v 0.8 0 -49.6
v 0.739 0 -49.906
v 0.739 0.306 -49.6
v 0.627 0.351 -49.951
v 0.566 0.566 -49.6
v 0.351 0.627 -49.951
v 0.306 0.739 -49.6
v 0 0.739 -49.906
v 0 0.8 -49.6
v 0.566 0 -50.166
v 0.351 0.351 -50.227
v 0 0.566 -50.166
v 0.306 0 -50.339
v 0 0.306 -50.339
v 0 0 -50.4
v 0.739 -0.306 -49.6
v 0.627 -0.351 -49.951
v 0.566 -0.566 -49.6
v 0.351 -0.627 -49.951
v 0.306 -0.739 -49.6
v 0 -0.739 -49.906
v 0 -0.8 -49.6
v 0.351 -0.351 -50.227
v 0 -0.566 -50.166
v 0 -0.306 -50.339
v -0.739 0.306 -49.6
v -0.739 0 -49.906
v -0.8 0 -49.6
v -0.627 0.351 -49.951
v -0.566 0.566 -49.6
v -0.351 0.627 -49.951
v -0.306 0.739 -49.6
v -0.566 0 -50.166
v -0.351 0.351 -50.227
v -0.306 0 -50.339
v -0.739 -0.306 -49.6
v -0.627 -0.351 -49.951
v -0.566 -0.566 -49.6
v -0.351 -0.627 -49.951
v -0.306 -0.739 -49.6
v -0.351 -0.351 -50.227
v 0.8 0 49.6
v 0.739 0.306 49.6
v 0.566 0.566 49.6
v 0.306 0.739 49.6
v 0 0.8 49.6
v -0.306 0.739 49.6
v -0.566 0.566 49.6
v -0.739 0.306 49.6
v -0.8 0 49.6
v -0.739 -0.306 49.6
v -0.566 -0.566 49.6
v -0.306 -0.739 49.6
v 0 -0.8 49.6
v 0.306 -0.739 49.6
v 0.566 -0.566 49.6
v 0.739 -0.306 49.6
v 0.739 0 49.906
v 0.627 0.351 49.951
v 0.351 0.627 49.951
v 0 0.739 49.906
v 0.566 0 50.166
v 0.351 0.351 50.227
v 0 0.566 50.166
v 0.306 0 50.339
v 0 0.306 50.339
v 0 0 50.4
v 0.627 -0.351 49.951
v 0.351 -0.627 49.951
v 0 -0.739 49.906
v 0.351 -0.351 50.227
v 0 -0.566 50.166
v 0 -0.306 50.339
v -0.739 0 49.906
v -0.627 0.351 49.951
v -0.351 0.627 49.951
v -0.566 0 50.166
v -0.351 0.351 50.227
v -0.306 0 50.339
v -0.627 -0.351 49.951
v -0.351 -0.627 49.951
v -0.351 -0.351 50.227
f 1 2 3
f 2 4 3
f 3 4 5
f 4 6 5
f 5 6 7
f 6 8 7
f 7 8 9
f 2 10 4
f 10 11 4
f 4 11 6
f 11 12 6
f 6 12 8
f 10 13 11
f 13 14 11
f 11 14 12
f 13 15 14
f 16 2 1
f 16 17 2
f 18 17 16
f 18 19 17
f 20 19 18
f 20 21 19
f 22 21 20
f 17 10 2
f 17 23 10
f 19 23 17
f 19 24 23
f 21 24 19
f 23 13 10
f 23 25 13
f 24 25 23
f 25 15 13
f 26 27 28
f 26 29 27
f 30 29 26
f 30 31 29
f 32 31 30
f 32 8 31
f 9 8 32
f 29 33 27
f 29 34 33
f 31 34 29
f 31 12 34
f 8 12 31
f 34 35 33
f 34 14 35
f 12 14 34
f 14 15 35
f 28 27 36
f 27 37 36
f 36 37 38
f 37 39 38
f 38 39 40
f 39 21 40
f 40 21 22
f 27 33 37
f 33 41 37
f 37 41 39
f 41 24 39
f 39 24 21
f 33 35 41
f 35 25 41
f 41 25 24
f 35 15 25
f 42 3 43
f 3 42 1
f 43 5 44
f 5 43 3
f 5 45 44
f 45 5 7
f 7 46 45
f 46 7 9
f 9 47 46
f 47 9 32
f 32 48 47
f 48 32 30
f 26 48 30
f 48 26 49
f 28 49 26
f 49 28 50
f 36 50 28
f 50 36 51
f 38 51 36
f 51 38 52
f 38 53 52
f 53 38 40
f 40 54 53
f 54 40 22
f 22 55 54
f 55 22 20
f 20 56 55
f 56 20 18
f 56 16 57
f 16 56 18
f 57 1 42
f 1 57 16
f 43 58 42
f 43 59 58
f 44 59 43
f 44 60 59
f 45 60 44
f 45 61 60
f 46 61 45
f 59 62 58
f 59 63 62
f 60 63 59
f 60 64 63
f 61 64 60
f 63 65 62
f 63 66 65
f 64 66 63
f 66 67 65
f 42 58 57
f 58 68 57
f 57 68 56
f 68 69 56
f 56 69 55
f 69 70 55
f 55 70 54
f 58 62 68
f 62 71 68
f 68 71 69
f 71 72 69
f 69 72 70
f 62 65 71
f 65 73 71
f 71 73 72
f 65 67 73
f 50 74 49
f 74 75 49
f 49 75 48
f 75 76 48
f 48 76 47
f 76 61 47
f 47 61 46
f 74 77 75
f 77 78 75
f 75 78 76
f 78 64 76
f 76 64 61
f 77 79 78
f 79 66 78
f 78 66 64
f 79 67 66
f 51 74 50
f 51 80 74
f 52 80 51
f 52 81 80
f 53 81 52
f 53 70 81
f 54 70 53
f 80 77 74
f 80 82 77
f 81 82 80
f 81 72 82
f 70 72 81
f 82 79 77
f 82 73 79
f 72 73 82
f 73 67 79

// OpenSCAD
// file: ../p/1-8sphe.scad
use <../lib.scad>
function ldraw_lib__1_8sphe() = [
// 0 Sphere 0.125
// 0 Name: 1-8sphe.dat
// 0 Author: James Jessiman
// 0 !LDRAW_ORG Primitive UPDATE 2012-03
// 0 !LICENSE Licensed under CC BY 2.0 and CC BY 4.0 : see CAreadme.txt
// 
// 0 BFC CERTIFY CCW
  [0,"BFC","CERTIFY"],
  [0,"BFC","CCW"],
// 
// 0 !HISTORY 2000-08-01 {Axel Poque} fixes to resolve L3P error messages.
// 0 !HISTORY 2000-08-01 {Manfred Moolhuysen} fixes to resolve L3P error messages.
// 0 !HISTORY 2000-09-30 [PTadmin] Official Update 2000-02
// 0 !HISTORY 2002-03-28 [hafhead] Made BFC compliant
// 0 !HISTORY 2002-04-25 [PTadmin] Official Update 2002-02
// 0 !HISTORY 2007-06-22 [PTadmin] Header formatted for Contributor Agreement
// 0 !HISTORY 2008-07-01 [PTadmin] Official Update 2008-01
// 0 !HISTORY 2010-09-12 [MagFors] Changed winding, removed duplicated cond-line, optimized filesize
// 0 !HISTORY 2010-12-31 [PTadmin] Official Update 2010-03
// 0 !HISTORY 2012-07-01 [tcobbs] Replaced with geometry from LDView
// 0 !HISTORY 2012-12-28 [PTadmin] Official Update 2012-03
// 
// 
// 3 16 1 0 0 0.9239 0.3827 0 0.9239 0 0.3827
  [3,16,1,0,0,0.9239,0.3827,0,0.9239,0,0.3827],
// 3 16 0.9239 0.3827 0 0.7836 0.4393 0.4393 0.9239 0 0.3827
  [3,16,0.9239,0.3827,0,0.7836,0.4393,0.4393,0.9239,0,0.3827],
// 3 16 0.9239 0 0.3827 0.7836 0.4393 0.4393 0.7071 0 0.7071
  [3,16,0.9239,0,0.3827,0.7836,0.4393,0.4393,0.7071,0,0.7071],
// 3 16 0.7836 0.4393 0.4393 0.4393 0.4393 0.7836 0.7071 0 0.7071
  [3,16,0.7836,0.4393,0.4393,0.4393,0.4393,0.7836,0.7071,0,0.7071],
// 3 16 0.7071 0 0.7071 0.4393 0.4393 0.7836 0.3827 0 0.9239
  [3,16,0.7071,0,0.7071,0.4393,0.4393,0.7836,0.3827,0,0.9239],
// 3 16 0.4393 0.4393 0.7836 0 0.3827 0.9239 0.3827 0 0.9239
  [3,16,0.4393,0.4393,0.7836,0,0.3827,0.9239,0.3827,0,0.9239],
// 3 16 0.3827 0 0.9239 0 0.3827 0.9239 0 0 1
  [3,16,0.3827,0,0.9239,0,0.3827,0.9239,0,0,1],
// 3 16 0.9239 0.3827 0 0.7071 0.7071 0 0.7836 0.4393 0.4393
  [3,16,0.9239,0.3827,0,0.7071,0.7071,0,0.7836,0.4393,0.4393],
// 3 16 0.7071 0.7071 0 0.4393 0.7836 0.4393 0.7836 0.4393 0.4393
  [3,16,0.7071,0.7071,0,0.4393,0.7836,0.4393,0.7836,0.4393,0.4393],
// 3 16 0.7836 0.4393 0.4393 0.4393 0.7836 0.4393 0.4393 0.4393 0.7836
  [3,16,0.7836,0.4393,0.4393,0.4393,0.7836,0.4393,0.4393,0.4393,0.7836],
// 3 16 0.4393 0.7836 0.4393 0 0.7071 0.7071 0.4393 0.4393 0.7836
  [3,16,0.4393,0.7836,0.4393,0,0.7071,0.7071,0.4393,0.4393,0.7836],
// 3 16 0.4393 0.4393 0.7836 0 0.7071 0.7071 0 0.3827 0.9239
  [3,16,0.4393,0.4393,0.7836,0,0.7071,0.7071,0,0.3827,0.9239],
// 3 16 0.7071 0.7071 0 0.3827 0.9239 0 0.4393 0.7836 0.4393
  [3,16,0.7071,0.7071,0,0.3827,0.9239,0,0.4393,0.7836,0.4393],
// 3 16 0.3827 0.9239 0 0 0.9239 0.3827 0.4393 0.7836 0.4393
  [3,16,0.3827,0.9239,0,0,0.9239,0.3827,0.4393,0.7836,0.4393],
// 3 16 0.4393 0.7836 0.4393 0 0.9239 0.3827 0 0.7071 0.7071
  [3,16,0.4393,0.7836,0.4393,0,0.9239,0.3827,0,0.7071,0.7071],
// 3 16 0.3827 0.9239 0 0 1 0 0 0.9239 0.3827
  [3,16,0.3827,0.9239,0,0,1,0,0,0.9239,0.3827],
// 
// 5 24 1 0 0 0.9239 0.3827 0 1 0 -0.1 0.9239 0 0.3827
  [5,24,1,0,0,0.9239,0.3827,0,1,0,-0.1,0.9239,0,0.3827],
// 5 24 0.9239 0.3827 0 0.9239 0 0.3827 1 0 0 0.7836 0.4393 0.4393
  [5,24,0.9239,0.3827,0,0.9239,0,0.3827,1,0,0,0.7836,0.4393,0.4393],
// 5 24 1 0 0 0.9239 0 0.3827 0.9239 0.3827 0 1 -0.1 0
  [5,24,1,0,0,0.9239,0,0.3827,0.9239,0.3827,0,1,-0.1,0],
// 5 24 0.9239 0 0.3827 0.7836 0.4393 0.4393 0.9239 0.3827 0 0.7071 0 0.7071
  [5,24,0.9239,0,0.3827,0.7836,0.4393,0.4393,0.9239,0.3827,0,0.7071,0,0.7071],
// 5 24 0.7836 0.4393 0.4393 0.7071 0 0.7071 0.9239 0 0.3827 0.4393 0.4393 0.7836
  [5,24,0.7836,0.4393,0.4393,0.7071,0,0.7071,0.9239,0,0.3827,0.4393,0.4393,0.7836],
// 5 24 0.9239 0 0.3827 0.7071 0 0.7071 0.7836 0.4393 0.4393 0.9239 -0.1 0.3827
  [5,24,0.9239,0,0.3827,0.7071,0,0.7071,0.7836,0.4393,0.4393,0.9239,-0.1,0.3827],
// 5 24 0.7071 0 0.7071 0.4393 0.4393 0.7836 0.7836 0.4393 0.4393 0.3827 0 0.9239
  [5,24,0.7071,0,0.7071,0.4393,0.4393,0.7836,0.7836,0.4393,0.4393,0.3827,0,0.9239],
// 5 24 0.4393 0.4393 0.7836 0.3827 0 0.9239 0.7071 0 0.7071 0 0.3827 0.9239
  [5,24,0.4393,0.4393,0.7836,0.3827,0,0.9239,0.7071,0,0.7071,0,0.3827,0.9239],
// 5 24 0.7071 0 0.7071 0.3827 0 0.9239 0.4393 0.4393 0.7836 0.7071 -0.1 0.7071
  [5,24,0.7071,0,0.7071,0.3827,0,0.9239,0.4393,0.4393,0.7836,0.7071,-0.1,0.7071],
// 5 24 0.3827 0 0.9239 0 0.3827 0.9239 0.4393 0.4393 0.7836 0 0 1
  [5,24,0.3827,0,0.9239,0,0.3827,0.9239,0.4393,0.4393,0.7836,0,0,1],
// 5 24 0 0.3827 0.9239 0 0 1 0.3827 0 0.9239 -0.1 0.3827 0.9239
  [5,24,0,0.3827,0.9239,0,0,1,0.3827,0,0.9239,-0.1,0.3827,0.9239],
// 5 24 0.3827 0 0.9239 0 0 1 0 0.3827 0.9239 0.3827 -0.1 0.9239
  [5,24,0.3827,0,0.9239,0,0,1,0,0.3827,0.9239,0.3827,-0.1,0.9239],
// 5 24 0.9239 0.3827 0 0.7071 0.7071 0 0.9239 0.3827 -0.1 0.7836 0.4393 0.4393
  [5,24,0.9239,0.3827,0,0.7071,0.7071,0,0.9239,0.3827,-0.1,0.7836,0.4393,0.4393],
// 5 24 0.7071 0.7071 0 0.7836 0.4393 0.4393 0.9239 0.3827 0 0.4393 0.7836 0.4393
  [5,24,0.7071,0.7071,0,0.7836,0.4393,0.4393,0.9239,0.3827,0,0.4393,0.7836,0.4393],
// 5 24 0.9239 0.3827 0 0.7836 0.4393 0.4393 0.7071 0.7071 0 0.9239 0 0.3827
  [5,24,0.9239,0.3827,0,0.7836,0.4393,0.4393,0.7071,0.7071,0,0.9239,0,0.3827],
// 5 24 0.7836 0.4393 0.4393 0.4393 0.7836 0.4393 0.7071 0.7071 0 0.4393 0.4393 0.7836
  [5,24,0.7836,0.4393,0.4393,0.4393,0.7836,0.4393,0.7071,0.7071,0,0.4393,0.4393,0.7836],
// 5 24 0.4393 0.7836 0.4393 0.4393 0.4393 0.7836 0.7836 0.4393 0.4393 0 0.7071 0.7071
  [5,24,0.4393,0.7836,0.4393,0.4393,0.4393,0.7836,0.7836,0.4393,0.4393,0,0.7071,0.7071],
// 5 24 0.7836 0.4393 0.4393 0.4393 0.4393 0.7836 0.4393 0.7836 0.4393 0.7071 0 0.7071
  [5,24,0.7836,0.4393,0.4393,0.4393,0.4393,0.7836,0.4393,0.7836,0.4393,0.7071,0,0.7071],
// 5 24 0.4393 0.4393 0.7836 0 0.7071 0.7071 0.4393 0.7836 0.4393 0 0.3827 0.9239
  [5,24,0.4393,0.4393,0.7836,0,0.7071,0.7071,0.4393,0.7836,0.4393,0,0.3827,0.9239],
// 5 24 0 0.7071 0.7071 0 0.3827 0.9239 0.4393 0.4393 0.7836 -0.1 0.7071 0.7071
  [5,24,0,0.7071,0.7071,0,0.3827,0.9239,0.4393,0.4393,0.7836,-0.1,0.7071,0.7071],
// 5 24 0.4393 0.4393 0.7836 0 0.3827 0.9239 0 0.7071 0.7071 0.3827 0 0.9239
  [5,24,0.4393,0.4393,0.7836,0,0.3827,0.9239,0,0.7071,0.7071,0.3827,0,0.9239],
// 5 24 0.7071 0.7071 0 0.3827 0.9239 0 0.7071 0.7071 -0.1 0.4393 0.7836 0.4393
  [5,24,0.7071,0.7071,0,0.3827,0.9239,0,0.7071,0.7071,-0.1,0.4393,0.7836,0.4393],
// 5 24 0.3827 0.9239 0 0.4393 0.7836 0.4393 0.7071 0.7071 0 0 0.9239 0.3827
  [5,24,0.3827,0.9239,0,0.4393,0.7836,0.4393,0.7071,0.7071,0,0,0.9239,0.3827],
// 5 24 0.7071 0.7071 0 0.4393 0.7836 0.4393 0.3827 0.9239 0 0.7836 0.4393 0.4393
  [5,24,0.7071,0.7071,0,0.4393,0.7836,0.4393,0.3827,0.9239,0,0.7836,0.4393,0.4393],
// 5 24 0.4393 0.7836 0.4393 0 0.9239 0.3827 0.3827 0.9239 0 0 0.7071 0.7071
  [5,24,0.4393,0.7836,0.4393,0,0.9239,0.3827,0.3827,0.9239,0,0,0.7071,0.7071],
// 5 24 0 0.9239 0.3827 0 0.7071 0.7071 0.4393 0.7836 0.4393 -0.1 0.9239 0.3827
  [5,24,0,0.9239,0.3827,0,0.7071,0.7071,0.4393,0.7836,0.4393,-0.1,0.9239,0.3827],
// 5 24 0.4393 0.7836 0.4393 0 0.7071 0.7071 0 0.9239 0.3827 0.4393 0.4393 0.7836
  [5,24,0.4393,0.7836,0.4393,0,0.7071,0.7071,0,0.9239,0.3827,0.4393,0.4393,0.7836],
// 5 24 0.3827 0.9239 0 0 1 0 0.3827 0.9239 -0.1 0 0.9239 0.3827
  [5,24,0.3827,0.9239,0,0,1,0,0.3827,0.9239,-0.1,0,0.9239,0.3827],
// 5 24 0 1 0 0 0.9239 0.3827 0.3827 0.9239 0 -0.1 1 0
  [5,24,0,1,0,0,0.9239,0.3827,0.3827,0.9239,0,-0.1,1,0],
// 5 24 0.3827 0.9239 0 0 0.9239 0.3827 0 1 0 0.4393 0.7836 0.4393
  [5,24,0.3827,0.9239,0,0,0.9239,0.3827,0,1,0,0.4393,0.7836,0.4393],
];
makepoly(ldraw_lib__1_8sphe(), line=0.2);
// file: ../p/4-8sphe.scad
use <../lib.scad>
use <1-8sphe.scad>
function ldraw_lib__4_8sphe() = [
// 0 Sphere 0.5
// 0 Name: 4-8sphe.dat
// 0 Author: James Jessiman
// 0 !LDRAW_ORG Primitive UPDATE 2003-02
// 0 !LICENSE Licensed under CC BY 2.0 and CC BY 4.0 : see CAreadme.txt
// 
// 0 BFC CERTIFY CCW
  [0,"BFC","CERTIFY"],
  [0,"BFC","CCW"],
// 
// 0 !HISTORY 2002-08-31 [izanette] Modified with WINDZ for BFC compliance
// 0 !HISTORY 2003-08-01 [PTadmin] Official Update 2003-02
// 0 !HISTORY 2007-06-24 [PTadmin] Header formatted for Contributor Agreement
// 0 !HISTORY 2008-07-01 [PTadmin] Official Update 2008-01
// 
// 
// 1 16 0 0 0 1 0 0 0 1 0 0 0 1 1-8sphe.dat
  [1,16,0,0,0,1,0,0,0,1,0,0,0,1, ldraw_lib__1_8sphe()],
// 1 16 0 0 0 1 0 0 0 1 0 0 0 -1 1-8sphe.dat
  [1,16,0,0,0,1,0,0,0,1,0,0,0,-1, ldraw_lib__1_8sphe()],
// 1 16 0 0 0 -1 0 0 0 1 0 0 0 1 1-8sphe.dat
  [1,16,0,0,0,-1,0,0,0,1,0,0,0,1, ldraw_lib__1_8sphe()],
// 1 16 0 0 0 -1 0 0 0 1 0 0 0 -1 1-8sphe.dat
  [1,16,0,0,0,-1,0,0,0,1,0,0,0,-1, ldraw_lib__1_8sphe()],
// 0
// 
];
makepoly(ldraw_lib__4_8sphe(), line=0.2);
// file: ../p/4-4cyli.scad
use <../lib.scad>
function ldraw_lib__4_4cyli() = [
// 0 Cylinder 1.0
// 0 Name: 4-4cyli.dat
// 0 Author: James Jessiman
// 0 !LDRAW_ORG Primitive UPDATE 2005-01
// 0 !LICENSE Licensed under CC BY 2.0 and CC BY 4.0 : see CAreadme.txt
// 
// 0 BFC CERTIFY CCW
  [0,"BFC","CERTIFY"],
  [0,"BFC","CCW"],
// 
// 0 !HISTORY 1998-12-15 [PTadmin] Official Update 1998-10
// 0 !HISTORY 2002-03-23 [sbliss] Added BFC statement; merged headers from files in distributions LDraw 0.27 and Complete.
// 0 !HISTORY 2002-04-25 [PTadmin] Official Update 2002-02
// 0 !HISTORY 2004-12-14 [guyvivan] BFC CCW
// 0 !HISTORY 2005-12-28 [PTadmin] Official Update 2005-01
// 0 !HISTORY 2007-06-24 [PTadmin] Header formatted for Contributor Agreement
// 0 !HISTORY 2008-07-01 [PTadmin] Official Update 2008-01
// 
// 
// 4 16 1 1 0 0.9239 1 0.3827 0.9239 0 0.3827 1 0 0
  [4,16,1,1,0,0.9239,1,0.3827,0.9239,0,0.3827,1,0,0],
// 5 24 1 0 0 1 1 0 0.9239 0 0.3827 0.9239 0 -0.3827
  [5,24,1,0,0,1,1,0,0.9239,0,0.3827,0.9239,0,-0.3827],
// 4 16 0.9239 1 0.3827 0.7071 1 0.7071 0.7071 0 0.7071 0.9239 0 0.3827
  [4,16,0.9239,1,0.3827,0.7071,1,0.7071,0.7071,0,0.7071,0.9239,0,0.3827],
// 5 24 0.9239 0 0.3827 0.9239 1 0.3827 0.7071 0 0.7071 1 0 0
  [5,24,0.9239,0,0.3827,0.9239,1,0.3827,0.7071,0,0.7071,1,0,0],
// 4 16 0.7071 1 0.7071 0.3827 1 0.9239 0.3827 0 0.9239 0.7071 0 0.7071
  [4,16,0.7071,1,0.7071,0.3827,1,0.9239,0.3827,0,0.9239,0.7071,0,0.7071],
// 5 24 0.7071 0 0.7071 0.7071 1 0.7071 0.3827 0 0.9239 0.9239 0 0.3827
  [5,24,0.7071,0,0.7071,0.7071,1,0.7071,0.3827,0,0.9239,0.9239,0,0.3827],
// 4 16 0.3827 1 0.9239 0 1 1 0 0 1 0.3827 0 0.9239
  [4,16,0.3827,1,0.9239,0,1,1,0,0,1,0.3827,0,0.9239],
// 5 24 0.3827 0 0.9239 0.3827 1 0.9239 0 0 1 0.7071 0 0.7071
  [5,24,0.3827,0,0.9239,0.3827,1,0.9239,0,0,1,0.7071,0,0.7071],
// 4 16 0 1 1 -0.3827 1 0.9239 -0.3827 0 0.9239 0 0 1
  [4,16,0,1,1,-0.3827,1,0.9239,-0.3827,0,0.9239,0,0,1],
// 5 24 0 0 1 0 1 1 -0.3827 0 0.9239 0.3827 0 0.9239
  [5,24,0,0,1,0,1,1,-0.3827,0,0.9239,0.3827,0,0.9239],
// 4 16 -0.3827 1 0.9239 -0.7071 1 0.7071 -0.7071 0 0.7071 -0.3827 0 0.9239
  [4,16,-0.3827,1,0.9239,-0.7071,1,0.7071,-0.7071,0,0.7071,-0.3827,0,0.9239],
// 5 24 -0.3827 0 0.9239 -0.3827 1 0.9239 -0.7071 0 0.7071 0 0 1
  [5,24,-0.3827,0,0.9239,-0.3827,1,0.9239,-0.7071,0,0.7071,0,0,1],
// 4 16 -0.7071 1 0.7071 -0.9239 1 0.3827 -0.9239 0 0.3827 -0.7071 0 0.7071
  [4,16,-0.7071,1,0.7071,-0.9239,1,0.3827,-0.9239,0,0.3827,-0.7071,0,0.7071],
// 5 24 -0.7071 0 0.7071 -0.7071 1 0.7071 -0.9239 0 0.3827 -0.3827 0 0.9239
  [5,24,-0.7071,0,0.7071,-0.7071,1,0.7071,-0.9239,0,0.3827,-0.3827,0,0.9239],
// 4 16 -0.9239 1 0.3827 -1 1 0 -1 0 0 -0.9239 0 0.3827
  [4,16,-0.9239,1,0.3827,-1,1,0,-1,0,0,-0.9239,0,0.3827],
// 5 24 -0.9239 0 0.3827 -0.9239 1 0.3827 -1 0 0 -0.7071 0 0.7071
  [5,24,-0.9239,0,0.3827,-0.9239,1,0.3827,-1,0,0,-0.7071,0,0.7071],
// 4 16 -1 1 0 -0.9239 1 -0.3827 -0.9239 0 -0.3827 -1 0 0
  [4,16,-1,1,0,-0.9239,1,-0.3827,-0.9239,0,-0.3827,-1,0,0],
// 5 24 -1 0 0 -1 1 0 -0.9239 0 -0.3827 -0.9239 0 0.3827
  [5,24,-1,0,0,-1,1,0,-0.9239,0,-0.3827,-0.9239,0,0.3827],
// 4 16 -0.9239 1 -0.3827 -0.7071 1 -0.7071 -0.7071 0 -0.7071 -0.9239 0 -0.3827
  [4,16,-0.9239,1,-0.3827,-0.7071,1,-0.7071,-0.7071,0,-0.7071,-0.9239,0,-0.3827],
// 5 24 -0.9239 0 -0.3827 -0.9239 1 -0.3827 -0.7071 0 -0.7071 -1 0 0
  [5,24,-0.9239,0,-0.3827,-0.9239,1,-0.3827,-0.7071,0,-0.7071,-1,0,0],
// 4 16 -0.7071 1 -0.7071 -0.3827 1 -0.9239 -0.3827 0 -0.9239 -0.7071 0 -0.7071
  [4,16,-0.7071,1,-0.7071,-0.3827,1,-0.9239,-0.3827,0,-0.9239,-0.7071,0,-0.7071],
// 5 24 -0.7071 0 -0.7071 -0.7071 1 -0.7071 -0.3827 0 -0.9239 -0.9239 0 -0.3827
  [5,24,-0.7071,0,-0.7071,-0.7071,1,-0.7071,-0.3827,0,-0.9239,-0.9239,0,-0.3827],
// 4 16 -0.3827 1 -0.9239 0 1 -1 0 0 -1 -0.3827 0 -0.9239
  [4,16,-0.3827,1,-0.9239,0,1,-1,0,0,-1,-0.3827,0,-0.9239],
// 5 24 -0.3827 0 -0.9239 -0.3827 1 -0.9239 0 0 -1 -0.7071 0 -0.7071
  [5,24,-0.3827,0,-0.9239,-0.3827,1,-0.9239,0,0,-1,-0.7071,0,-0.7071],
// 4 16 0 1 -1 0.3827 1 -0.9239 0.3827 0 -0.9239 0 0 -1
  [4,16,0,1,-1,0.3827,1,-0.9239,0.3827,0,-0.9239,0,0,-1],
// 5 24 0 0 -1 0 1 -1 0.3827 0 -0.9239 -0.3827 0 -0.9239
  [5,24,0,0,-1,0,1,-1,0.3827,0,-0.9239,-0.3827,0,-0.9239],
// 4 16 0.3827 1 -0.9239 0.7071 1 -0.7071 0.7071 0 -0.7071 0.3827 0 -0.9239
  [4,16,0.3827,1,-0.9239,0.7071,1,-0.7071,0.7071,0,-0.7071,0.3827,0,-0.9239],
// 5 24 0.3827 0 -0.9239 0.3827 1 -0.9239 0.7071 0 -0.7071 0 0 -1
  [5,24,0.3827,0,-0.9239,0.3827,1,-0.9239,0.7071,0,-0.7071,0,0,-1],
// 4 16 0.7071 1 -0.7071 0.9239 1 -0.3827 0.9239 0 -0.3827 0.7071 0 -0.7071
  [4,16,0.7071,1,-0.7071,0.9239,1,-0.3827,0.9239,0,-0.3827,0.7071,0,-0.7071],
// 5 24 0.7071 0 -0.7071 0.7071 1 -0.7071 0.9239 0 -0.3827 0.3827 0 -0.9239
  [5,24,0.7071,0,-0.7071,0.7071,1,-0.7071,0.9239,0,-0.3827,0.3827,0,-0.9239],
// 4 16 0.9239 1 -0.3827 1 1 0 1 0 0 0.9239 0 -0.3827
  [4,16,0.9239,1,-0.3827,1,1,0,1,0,0,0.9239,0,-0.3827],
// 5 24 0.9239 0 -0.3827 0.9239 1 -0.3827 1 0 0 0.7071 0 -0.7071
  [5,24,0.9239,0,-0.3827,0.9239,1,-0.3827,1,0,0,0.7071,0,-0.7071],
// 0
];
makepoly(ldraw_lib__4_4cyli(), line=0.2);
// main file
use <../lib.scad>
use <../p/4-4cyli.scad>
use <../p/4-8sphe.scad>
function ldraw_lib__129() = [
// 0 ~Train Signal Semaphore Metal Bar
// 0 Name: 129.dat
// 0 Author: Niels Karsdorp [nielsk]
// 0 !LDRAW_ORG Part UPDATE 2010-02
// 0 !LICENSE Licensed under CC BY 2.0 and CC BY 4.0 : see CAreadme.txt
// 
// 0 BFC CERTIFY CW
  [0,"BFC","CERTIFY"],
  [0,"BFC","CW"],
// 
// 0 !HISTORY 2010-07-05 [PTadmin] Official Update 2010-02
// 
// 
// 1 16 0 124 0 2 0 0 0 2 0 0 0 2 4-8sphe.dat
  [1,16,0,124,0,2,0,0,0,2,0,0,0,2, ldraw_lib__4_8sphe()],
// 1 16 0 124 0 2 0 0 0 -248 0 0 0 2 4-4cyli.dat
  [1,16,0,124,0,2,0,0,0,-248,0,0,0,2, ldraw_lib__4_4cyli()],
// 1 16 0 -124 0 2 0 0 0 -2 0 0 0 2 4-8sphe.dat
  [1,16,0,-124,0,2,0,0,0,-2,0,0,0,2, ldraw_lib__4_8sphe()],
// 0
];
makepoly(ldraw_lib__129(), line=0.2);
